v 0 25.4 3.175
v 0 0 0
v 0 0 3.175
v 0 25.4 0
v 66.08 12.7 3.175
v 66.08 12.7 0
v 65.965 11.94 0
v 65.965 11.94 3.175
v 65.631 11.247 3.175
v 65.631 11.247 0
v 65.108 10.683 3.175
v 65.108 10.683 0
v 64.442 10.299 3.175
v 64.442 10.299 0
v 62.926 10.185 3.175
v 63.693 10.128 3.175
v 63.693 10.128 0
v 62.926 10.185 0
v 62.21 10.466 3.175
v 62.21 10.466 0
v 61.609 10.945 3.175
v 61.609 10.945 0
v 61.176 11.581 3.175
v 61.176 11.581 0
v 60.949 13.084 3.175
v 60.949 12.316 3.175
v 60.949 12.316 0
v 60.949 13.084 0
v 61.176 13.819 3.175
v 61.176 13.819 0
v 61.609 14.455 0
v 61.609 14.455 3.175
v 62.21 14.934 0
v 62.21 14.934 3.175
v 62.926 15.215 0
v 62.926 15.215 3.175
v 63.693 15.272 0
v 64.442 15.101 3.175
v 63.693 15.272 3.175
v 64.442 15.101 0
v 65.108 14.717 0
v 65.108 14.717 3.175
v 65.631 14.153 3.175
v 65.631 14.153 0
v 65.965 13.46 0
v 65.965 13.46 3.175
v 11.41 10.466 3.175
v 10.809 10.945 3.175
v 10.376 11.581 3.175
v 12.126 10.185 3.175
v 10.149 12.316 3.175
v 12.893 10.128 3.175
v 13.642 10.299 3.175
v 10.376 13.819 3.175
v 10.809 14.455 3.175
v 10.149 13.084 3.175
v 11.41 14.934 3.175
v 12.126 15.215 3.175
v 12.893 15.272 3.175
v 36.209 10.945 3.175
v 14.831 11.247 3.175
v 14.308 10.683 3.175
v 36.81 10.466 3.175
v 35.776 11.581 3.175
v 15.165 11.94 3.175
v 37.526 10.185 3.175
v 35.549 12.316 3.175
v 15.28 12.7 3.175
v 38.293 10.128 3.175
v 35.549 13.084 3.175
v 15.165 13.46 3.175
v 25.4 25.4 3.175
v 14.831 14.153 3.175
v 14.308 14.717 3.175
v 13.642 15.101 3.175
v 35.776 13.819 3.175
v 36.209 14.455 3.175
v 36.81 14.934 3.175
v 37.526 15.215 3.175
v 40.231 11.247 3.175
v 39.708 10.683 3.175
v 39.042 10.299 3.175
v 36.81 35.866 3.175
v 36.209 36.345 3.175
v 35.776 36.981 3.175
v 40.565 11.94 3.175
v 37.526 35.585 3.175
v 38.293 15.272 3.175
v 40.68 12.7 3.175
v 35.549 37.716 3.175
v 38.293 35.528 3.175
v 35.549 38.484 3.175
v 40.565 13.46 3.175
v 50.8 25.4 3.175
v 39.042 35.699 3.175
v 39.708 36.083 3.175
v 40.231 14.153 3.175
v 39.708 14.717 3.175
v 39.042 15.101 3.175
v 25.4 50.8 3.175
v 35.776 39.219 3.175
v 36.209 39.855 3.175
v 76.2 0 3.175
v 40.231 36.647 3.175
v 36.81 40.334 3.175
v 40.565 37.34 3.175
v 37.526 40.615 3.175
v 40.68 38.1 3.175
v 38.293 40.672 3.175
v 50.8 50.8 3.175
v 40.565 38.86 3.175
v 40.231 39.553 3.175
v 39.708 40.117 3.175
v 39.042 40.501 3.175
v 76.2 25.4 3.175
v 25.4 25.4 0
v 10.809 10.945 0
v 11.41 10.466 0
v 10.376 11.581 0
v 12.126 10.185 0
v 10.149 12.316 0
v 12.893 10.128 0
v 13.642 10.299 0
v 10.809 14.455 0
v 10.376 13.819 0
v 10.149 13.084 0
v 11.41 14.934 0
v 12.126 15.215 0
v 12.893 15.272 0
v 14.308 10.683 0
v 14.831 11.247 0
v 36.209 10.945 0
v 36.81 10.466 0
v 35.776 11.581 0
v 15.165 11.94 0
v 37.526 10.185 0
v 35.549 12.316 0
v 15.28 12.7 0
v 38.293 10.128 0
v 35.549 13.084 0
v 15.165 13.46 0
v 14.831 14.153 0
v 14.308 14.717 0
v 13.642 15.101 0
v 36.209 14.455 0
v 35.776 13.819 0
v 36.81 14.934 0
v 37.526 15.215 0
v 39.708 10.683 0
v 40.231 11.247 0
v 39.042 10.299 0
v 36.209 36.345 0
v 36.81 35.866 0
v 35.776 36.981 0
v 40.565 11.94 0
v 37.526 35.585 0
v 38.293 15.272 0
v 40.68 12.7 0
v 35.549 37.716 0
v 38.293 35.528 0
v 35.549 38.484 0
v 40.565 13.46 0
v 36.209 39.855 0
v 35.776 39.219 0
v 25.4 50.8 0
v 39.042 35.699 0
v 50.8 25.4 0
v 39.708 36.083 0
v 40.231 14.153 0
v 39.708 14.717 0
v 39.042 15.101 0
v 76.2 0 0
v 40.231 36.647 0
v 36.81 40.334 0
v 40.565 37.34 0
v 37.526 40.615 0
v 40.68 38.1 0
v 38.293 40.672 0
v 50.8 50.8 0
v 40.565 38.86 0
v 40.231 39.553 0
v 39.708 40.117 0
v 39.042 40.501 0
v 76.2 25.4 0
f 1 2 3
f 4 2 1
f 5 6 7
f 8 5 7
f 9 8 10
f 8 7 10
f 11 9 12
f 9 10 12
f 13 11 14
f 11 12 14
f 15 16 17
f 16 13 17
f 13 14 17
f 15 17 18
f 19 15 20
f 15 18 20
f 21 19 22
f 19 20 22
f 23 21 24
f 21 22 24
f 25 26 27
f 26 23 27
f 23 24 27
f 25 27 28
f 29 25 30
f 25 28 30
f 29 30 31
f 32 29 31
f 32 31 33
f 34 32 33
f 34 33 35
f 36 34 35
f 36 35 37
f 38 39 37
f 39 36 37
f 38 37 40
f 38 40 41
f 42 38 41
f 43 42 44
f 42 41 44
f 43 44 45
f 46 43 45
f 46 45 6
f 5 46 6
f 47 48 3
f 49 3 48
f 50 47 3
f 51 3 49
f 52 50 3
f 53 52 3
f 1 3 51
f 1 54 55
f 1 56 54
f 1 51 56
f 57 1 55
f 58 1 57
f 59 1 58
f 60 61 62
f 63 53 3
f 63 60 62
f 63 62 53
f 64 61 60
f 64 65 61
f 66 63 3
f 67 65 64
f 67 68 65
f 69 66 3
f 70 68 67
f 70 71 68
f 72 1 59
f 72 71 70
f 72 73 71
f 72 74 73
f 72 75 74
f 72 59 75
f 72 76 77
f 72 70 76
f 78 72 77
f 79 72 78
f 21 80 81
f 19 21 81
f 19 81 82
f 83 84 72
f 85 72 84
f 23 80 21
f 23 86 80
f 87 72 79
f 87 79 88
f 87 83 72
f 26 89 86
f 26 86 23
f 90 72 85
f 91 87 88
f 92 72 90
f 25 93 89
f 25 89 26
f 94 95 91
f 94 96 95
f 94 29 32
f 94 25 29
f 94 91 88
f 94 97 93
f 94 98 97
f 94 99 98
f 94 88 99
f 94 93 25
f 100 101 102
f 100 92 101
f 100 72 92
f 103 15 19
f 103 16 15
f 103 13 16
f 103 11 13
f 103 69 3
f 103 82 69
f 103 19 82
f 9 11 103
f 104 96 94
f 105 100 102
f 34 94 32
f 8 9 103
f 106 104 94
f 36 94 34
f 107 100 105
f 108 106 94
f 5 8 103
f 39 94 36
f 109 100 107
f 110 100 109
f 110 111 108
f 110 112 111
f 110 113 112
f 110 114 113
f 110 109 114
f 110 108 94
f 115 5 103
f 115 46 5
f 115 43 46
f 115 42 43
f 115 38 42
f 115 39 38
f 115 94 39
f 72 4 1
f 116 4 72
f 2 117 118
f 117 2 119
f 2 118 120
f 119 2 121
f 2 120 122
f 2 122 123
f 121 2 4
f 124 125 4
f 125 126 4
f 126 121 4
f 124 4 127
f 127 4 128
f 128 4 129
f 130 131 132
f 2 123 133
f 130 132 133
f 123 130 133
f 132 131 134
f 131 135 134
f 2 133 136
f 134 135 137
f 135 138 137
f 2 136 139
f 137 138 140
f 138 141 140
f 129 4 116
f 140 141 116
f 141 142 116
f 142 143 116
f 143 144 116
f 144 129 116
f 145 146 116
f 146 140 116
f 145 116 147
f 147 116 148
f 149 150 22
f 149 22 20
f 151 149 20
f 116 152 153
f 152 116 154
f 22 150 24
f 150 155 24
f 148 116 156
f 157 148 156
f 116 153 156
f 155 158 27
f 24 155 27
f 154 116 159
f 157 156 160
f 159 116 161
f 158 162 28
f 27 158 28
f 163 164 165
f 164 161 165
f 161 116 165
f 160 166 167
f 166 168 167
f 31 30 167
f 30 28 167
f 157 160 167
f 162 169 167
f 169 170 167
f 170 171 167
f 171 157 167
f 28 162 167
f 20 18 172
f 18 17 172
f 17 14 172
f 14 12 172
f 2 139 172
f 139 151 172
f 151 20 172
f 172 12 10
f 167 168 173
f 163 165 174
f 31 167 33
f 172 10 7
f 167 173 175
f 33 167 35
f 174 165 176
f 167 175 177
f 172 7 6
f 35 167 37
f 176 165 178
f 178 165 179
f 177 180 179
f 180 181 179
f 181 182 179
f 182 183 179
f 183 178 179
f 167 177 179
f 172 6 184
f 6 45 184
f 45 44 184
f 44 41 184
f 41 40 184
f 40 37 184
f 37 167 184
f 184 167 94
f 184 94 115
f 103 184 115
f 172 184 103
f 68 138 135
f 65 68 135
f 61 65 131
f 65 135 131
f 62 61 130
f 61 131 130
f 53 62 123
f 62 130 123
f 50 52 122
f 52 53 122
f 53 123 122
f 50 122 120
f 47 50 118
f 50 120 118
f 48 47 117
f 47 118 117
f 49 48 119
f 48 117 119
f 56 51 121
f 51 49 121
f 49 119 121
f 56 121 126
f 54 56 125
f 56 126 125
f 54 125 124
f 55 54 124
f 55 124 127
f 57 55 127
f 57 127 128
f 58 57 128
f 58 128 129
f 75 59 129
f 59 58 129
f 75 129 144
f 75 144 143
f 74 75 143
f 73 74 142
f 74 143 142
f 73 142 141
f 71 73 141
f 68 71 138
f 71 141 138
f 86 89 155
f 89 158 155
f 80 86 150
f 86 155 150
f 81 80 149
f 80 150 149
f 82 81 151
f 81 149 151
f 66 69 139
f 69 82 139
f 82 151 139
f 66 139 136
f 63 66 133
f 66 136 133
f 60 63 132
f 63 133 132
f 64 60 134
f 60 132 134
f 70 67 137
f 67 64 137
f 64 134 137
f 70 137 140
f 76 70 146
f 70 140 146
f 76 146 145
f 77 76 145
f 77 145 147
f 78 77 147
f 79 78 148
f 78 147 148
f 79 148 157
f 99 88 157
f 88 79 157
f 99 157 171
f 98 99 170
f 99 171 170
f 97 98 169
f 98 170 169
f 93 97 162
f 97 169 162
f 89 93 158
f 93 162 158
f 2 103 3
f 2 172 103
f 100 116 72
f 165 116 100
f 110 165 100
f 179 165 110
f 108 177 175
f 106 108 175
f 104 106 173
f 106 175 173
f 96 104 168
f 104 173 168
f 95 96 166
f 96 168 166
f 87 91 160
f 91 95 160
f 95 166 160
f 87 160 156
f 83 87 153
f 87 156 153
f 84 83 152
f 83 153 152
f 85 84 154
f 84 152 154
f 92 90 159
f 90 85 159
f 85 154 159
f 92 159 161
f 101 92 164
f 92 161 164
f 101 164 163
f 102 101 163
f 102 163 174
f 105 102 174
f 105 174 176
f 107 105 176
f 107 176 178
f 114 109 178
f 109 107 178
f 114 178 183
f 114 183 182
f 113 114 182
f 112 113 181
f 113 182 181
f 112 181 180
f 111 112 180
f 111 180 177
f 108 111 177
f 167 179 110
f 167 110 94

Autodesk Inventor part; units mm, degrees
ref_plane "YZ Plane" through (0, 0, 0) normal (1, 0, 0) x (0, 1, 0)
ref_plane "XZ Plane" through (0, 0, 0) normal (0, 1, 0) x (-1, 0, 0)
ref_plane "XY Plane" through (0, 0, 0) normal (0, 0, 1) x (1, 0, 0)
sketch "Sketch1" plane through (0, 0, 0) normal (0, 0, 1) x (1, 0, 0)
  line L0 (0, 0) -> (0, 25.4)
  line L1 (0, 25.4) -> (25.4, 25.4)
  line L2 (25.4, 25.4) -> (25.4, 50.8)
  line L3 (25.4, 50.8) -> (50.8, 50.8)
  line L4 (50.8, 50.8) -> (50.8, 25.4)
  line L5 (50.8, 25.4) -> (76.2, 25.4)
  line L6 (76.2, 25.4) -> (76.2, 0)
  line L7 (76.2, 0) -> (0, 0)
  line L8 (0, 12.7) -> (12.7, 12.7) construction
  line L9 (12.7, 12.7) -> (38.1, 12.7) construction
  line L10 (38.1, 12.7) -> (63.5, 12.7) construction
  line L11 (38.1, 12.7) -> (38.1, 38.1) construction
  circle A0 centre (38.1, 12.7) radius 2.5797
  circle A1 centre (63.5, 12.7) radius 2.5797
  circle A2 centre (12.7, 12.7) radius 2.5797
  circle A3 centre (38.1, 38.1) radius 2.5797
  dimension "d0" = 25.4
  dimension "d1" = 25.4
  dimension "d2" = 25.4
  dimension "d3" = 25.4
  dimension "d4" = 25.4
  dimension "d5" = 25.4
  dimension "d6" = 12.7
  dimension "d7" = 25.4
  dimension "d8" = 25.4
  dimension "d9" = 5.1594
extrude "Extrusion1" add sketch "Sketch1" along normal blind 3.175
properties part number "Short T-Gusset"
